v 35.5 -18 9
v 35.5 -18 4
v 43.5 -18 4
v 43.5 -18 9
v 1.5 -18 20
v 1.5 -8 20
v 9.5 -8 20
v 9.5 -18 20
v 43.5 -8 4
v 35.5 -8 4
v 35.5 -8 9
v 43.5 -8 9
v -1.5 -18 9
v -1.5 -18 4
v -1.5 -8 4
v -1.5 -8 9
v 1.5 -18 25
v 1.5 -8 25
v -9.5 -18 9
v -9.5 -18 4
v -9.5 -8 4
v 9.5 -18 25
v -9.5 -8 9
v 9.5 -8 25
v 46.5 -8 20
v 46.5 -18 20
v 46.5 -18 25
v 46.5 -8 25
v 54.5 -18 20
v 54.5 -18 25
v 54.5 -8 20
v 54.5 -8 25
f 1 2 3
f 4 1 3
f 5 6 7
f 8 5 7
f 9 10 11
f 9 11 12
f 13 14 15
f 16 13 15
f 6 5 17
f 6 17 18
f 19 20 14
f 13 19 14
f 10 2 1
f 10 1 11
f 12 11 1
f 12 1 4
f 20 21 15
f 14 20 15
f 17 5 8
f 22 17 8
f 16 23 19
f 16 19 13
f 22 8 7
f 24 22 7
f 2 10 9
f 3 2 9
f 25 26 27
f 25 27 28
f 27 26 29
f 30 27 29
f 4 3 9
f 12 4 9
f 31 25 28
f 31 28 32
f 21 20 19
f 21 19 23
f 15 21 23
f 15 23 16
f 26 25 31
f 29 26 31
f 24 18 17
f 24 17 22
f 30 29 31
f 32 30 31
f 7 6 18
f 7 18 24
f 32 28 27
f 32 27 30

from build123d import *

# Parameters (mm, degrees)
BOX037_W     = 8
BOX037_H     = 10
BOX037_DEPTH = 5
BOX035_W     = 8
BOX035_H     = 10
BOX035_DEPTH = 5
BOX036_W     = 8
BOX036_H     = 10
BOX036_DEPTH = 5
BOX034_W     = 8
BOX034_H     = 10
BOX034_DEPTH = 5


with BuildPart() as w_rfel036:
    # Box037 → Box037 (new body)
    with BuildSketch(Plane(origin=(46.5, -18, 20), x_dir=(1, 0, 0), z_dir=(0, 0, 1))):
        with Locations((4, 5)):
            Rectangle(BOX037_W, BOX037_H)
    extrude(amount=BOX037_DEPTH)


with BuildPart() as w_rfel034:
    # Box035 → Box035 (new body)
    with BuildSketch(Plane(origin=(35.5, -18, 4), x_dir=(1, 0, 0), z_dir=(0, 0, 1))):
        with Locations((4, 5)):
            Rectangle(BOX035_W, BOX035_H)
    extrude(amount=BOX035_DEPTH)


with BuildPart() as w_rfel035:
    # Box036 → Box036 (new body)
    with BuildSketch(Plane(origin=(1.5, -18, 20), x_dir=(1, 0, 0), z_dir=(0, 0, 1))):
        with Locations((4, 5)):
            Rectangle(BOX036_W, BOX036_H)
    extrude(amount=BOX036_DEPTH)


with BuildPart() as sripperholes:
    # Box034 → Box034 (new body)
    with BuildSketch(Plane(origin=(-9.5, -18, 4), x_dir=(1, 0, 0), z_dir=(0, 0, 1))):
        with Locations((4, 5)):
            Rectangle(BOX034_W, BOX034_H)
    extrude(amount=BOX034_DEPTH)

    # Fusion026015: union Würfel036, Würfel034, Würfel035
    add(w_rfel036.part)
    add(w_rfel034.part)
    add(w_rfel035.part)


solid = sripperholes.part
